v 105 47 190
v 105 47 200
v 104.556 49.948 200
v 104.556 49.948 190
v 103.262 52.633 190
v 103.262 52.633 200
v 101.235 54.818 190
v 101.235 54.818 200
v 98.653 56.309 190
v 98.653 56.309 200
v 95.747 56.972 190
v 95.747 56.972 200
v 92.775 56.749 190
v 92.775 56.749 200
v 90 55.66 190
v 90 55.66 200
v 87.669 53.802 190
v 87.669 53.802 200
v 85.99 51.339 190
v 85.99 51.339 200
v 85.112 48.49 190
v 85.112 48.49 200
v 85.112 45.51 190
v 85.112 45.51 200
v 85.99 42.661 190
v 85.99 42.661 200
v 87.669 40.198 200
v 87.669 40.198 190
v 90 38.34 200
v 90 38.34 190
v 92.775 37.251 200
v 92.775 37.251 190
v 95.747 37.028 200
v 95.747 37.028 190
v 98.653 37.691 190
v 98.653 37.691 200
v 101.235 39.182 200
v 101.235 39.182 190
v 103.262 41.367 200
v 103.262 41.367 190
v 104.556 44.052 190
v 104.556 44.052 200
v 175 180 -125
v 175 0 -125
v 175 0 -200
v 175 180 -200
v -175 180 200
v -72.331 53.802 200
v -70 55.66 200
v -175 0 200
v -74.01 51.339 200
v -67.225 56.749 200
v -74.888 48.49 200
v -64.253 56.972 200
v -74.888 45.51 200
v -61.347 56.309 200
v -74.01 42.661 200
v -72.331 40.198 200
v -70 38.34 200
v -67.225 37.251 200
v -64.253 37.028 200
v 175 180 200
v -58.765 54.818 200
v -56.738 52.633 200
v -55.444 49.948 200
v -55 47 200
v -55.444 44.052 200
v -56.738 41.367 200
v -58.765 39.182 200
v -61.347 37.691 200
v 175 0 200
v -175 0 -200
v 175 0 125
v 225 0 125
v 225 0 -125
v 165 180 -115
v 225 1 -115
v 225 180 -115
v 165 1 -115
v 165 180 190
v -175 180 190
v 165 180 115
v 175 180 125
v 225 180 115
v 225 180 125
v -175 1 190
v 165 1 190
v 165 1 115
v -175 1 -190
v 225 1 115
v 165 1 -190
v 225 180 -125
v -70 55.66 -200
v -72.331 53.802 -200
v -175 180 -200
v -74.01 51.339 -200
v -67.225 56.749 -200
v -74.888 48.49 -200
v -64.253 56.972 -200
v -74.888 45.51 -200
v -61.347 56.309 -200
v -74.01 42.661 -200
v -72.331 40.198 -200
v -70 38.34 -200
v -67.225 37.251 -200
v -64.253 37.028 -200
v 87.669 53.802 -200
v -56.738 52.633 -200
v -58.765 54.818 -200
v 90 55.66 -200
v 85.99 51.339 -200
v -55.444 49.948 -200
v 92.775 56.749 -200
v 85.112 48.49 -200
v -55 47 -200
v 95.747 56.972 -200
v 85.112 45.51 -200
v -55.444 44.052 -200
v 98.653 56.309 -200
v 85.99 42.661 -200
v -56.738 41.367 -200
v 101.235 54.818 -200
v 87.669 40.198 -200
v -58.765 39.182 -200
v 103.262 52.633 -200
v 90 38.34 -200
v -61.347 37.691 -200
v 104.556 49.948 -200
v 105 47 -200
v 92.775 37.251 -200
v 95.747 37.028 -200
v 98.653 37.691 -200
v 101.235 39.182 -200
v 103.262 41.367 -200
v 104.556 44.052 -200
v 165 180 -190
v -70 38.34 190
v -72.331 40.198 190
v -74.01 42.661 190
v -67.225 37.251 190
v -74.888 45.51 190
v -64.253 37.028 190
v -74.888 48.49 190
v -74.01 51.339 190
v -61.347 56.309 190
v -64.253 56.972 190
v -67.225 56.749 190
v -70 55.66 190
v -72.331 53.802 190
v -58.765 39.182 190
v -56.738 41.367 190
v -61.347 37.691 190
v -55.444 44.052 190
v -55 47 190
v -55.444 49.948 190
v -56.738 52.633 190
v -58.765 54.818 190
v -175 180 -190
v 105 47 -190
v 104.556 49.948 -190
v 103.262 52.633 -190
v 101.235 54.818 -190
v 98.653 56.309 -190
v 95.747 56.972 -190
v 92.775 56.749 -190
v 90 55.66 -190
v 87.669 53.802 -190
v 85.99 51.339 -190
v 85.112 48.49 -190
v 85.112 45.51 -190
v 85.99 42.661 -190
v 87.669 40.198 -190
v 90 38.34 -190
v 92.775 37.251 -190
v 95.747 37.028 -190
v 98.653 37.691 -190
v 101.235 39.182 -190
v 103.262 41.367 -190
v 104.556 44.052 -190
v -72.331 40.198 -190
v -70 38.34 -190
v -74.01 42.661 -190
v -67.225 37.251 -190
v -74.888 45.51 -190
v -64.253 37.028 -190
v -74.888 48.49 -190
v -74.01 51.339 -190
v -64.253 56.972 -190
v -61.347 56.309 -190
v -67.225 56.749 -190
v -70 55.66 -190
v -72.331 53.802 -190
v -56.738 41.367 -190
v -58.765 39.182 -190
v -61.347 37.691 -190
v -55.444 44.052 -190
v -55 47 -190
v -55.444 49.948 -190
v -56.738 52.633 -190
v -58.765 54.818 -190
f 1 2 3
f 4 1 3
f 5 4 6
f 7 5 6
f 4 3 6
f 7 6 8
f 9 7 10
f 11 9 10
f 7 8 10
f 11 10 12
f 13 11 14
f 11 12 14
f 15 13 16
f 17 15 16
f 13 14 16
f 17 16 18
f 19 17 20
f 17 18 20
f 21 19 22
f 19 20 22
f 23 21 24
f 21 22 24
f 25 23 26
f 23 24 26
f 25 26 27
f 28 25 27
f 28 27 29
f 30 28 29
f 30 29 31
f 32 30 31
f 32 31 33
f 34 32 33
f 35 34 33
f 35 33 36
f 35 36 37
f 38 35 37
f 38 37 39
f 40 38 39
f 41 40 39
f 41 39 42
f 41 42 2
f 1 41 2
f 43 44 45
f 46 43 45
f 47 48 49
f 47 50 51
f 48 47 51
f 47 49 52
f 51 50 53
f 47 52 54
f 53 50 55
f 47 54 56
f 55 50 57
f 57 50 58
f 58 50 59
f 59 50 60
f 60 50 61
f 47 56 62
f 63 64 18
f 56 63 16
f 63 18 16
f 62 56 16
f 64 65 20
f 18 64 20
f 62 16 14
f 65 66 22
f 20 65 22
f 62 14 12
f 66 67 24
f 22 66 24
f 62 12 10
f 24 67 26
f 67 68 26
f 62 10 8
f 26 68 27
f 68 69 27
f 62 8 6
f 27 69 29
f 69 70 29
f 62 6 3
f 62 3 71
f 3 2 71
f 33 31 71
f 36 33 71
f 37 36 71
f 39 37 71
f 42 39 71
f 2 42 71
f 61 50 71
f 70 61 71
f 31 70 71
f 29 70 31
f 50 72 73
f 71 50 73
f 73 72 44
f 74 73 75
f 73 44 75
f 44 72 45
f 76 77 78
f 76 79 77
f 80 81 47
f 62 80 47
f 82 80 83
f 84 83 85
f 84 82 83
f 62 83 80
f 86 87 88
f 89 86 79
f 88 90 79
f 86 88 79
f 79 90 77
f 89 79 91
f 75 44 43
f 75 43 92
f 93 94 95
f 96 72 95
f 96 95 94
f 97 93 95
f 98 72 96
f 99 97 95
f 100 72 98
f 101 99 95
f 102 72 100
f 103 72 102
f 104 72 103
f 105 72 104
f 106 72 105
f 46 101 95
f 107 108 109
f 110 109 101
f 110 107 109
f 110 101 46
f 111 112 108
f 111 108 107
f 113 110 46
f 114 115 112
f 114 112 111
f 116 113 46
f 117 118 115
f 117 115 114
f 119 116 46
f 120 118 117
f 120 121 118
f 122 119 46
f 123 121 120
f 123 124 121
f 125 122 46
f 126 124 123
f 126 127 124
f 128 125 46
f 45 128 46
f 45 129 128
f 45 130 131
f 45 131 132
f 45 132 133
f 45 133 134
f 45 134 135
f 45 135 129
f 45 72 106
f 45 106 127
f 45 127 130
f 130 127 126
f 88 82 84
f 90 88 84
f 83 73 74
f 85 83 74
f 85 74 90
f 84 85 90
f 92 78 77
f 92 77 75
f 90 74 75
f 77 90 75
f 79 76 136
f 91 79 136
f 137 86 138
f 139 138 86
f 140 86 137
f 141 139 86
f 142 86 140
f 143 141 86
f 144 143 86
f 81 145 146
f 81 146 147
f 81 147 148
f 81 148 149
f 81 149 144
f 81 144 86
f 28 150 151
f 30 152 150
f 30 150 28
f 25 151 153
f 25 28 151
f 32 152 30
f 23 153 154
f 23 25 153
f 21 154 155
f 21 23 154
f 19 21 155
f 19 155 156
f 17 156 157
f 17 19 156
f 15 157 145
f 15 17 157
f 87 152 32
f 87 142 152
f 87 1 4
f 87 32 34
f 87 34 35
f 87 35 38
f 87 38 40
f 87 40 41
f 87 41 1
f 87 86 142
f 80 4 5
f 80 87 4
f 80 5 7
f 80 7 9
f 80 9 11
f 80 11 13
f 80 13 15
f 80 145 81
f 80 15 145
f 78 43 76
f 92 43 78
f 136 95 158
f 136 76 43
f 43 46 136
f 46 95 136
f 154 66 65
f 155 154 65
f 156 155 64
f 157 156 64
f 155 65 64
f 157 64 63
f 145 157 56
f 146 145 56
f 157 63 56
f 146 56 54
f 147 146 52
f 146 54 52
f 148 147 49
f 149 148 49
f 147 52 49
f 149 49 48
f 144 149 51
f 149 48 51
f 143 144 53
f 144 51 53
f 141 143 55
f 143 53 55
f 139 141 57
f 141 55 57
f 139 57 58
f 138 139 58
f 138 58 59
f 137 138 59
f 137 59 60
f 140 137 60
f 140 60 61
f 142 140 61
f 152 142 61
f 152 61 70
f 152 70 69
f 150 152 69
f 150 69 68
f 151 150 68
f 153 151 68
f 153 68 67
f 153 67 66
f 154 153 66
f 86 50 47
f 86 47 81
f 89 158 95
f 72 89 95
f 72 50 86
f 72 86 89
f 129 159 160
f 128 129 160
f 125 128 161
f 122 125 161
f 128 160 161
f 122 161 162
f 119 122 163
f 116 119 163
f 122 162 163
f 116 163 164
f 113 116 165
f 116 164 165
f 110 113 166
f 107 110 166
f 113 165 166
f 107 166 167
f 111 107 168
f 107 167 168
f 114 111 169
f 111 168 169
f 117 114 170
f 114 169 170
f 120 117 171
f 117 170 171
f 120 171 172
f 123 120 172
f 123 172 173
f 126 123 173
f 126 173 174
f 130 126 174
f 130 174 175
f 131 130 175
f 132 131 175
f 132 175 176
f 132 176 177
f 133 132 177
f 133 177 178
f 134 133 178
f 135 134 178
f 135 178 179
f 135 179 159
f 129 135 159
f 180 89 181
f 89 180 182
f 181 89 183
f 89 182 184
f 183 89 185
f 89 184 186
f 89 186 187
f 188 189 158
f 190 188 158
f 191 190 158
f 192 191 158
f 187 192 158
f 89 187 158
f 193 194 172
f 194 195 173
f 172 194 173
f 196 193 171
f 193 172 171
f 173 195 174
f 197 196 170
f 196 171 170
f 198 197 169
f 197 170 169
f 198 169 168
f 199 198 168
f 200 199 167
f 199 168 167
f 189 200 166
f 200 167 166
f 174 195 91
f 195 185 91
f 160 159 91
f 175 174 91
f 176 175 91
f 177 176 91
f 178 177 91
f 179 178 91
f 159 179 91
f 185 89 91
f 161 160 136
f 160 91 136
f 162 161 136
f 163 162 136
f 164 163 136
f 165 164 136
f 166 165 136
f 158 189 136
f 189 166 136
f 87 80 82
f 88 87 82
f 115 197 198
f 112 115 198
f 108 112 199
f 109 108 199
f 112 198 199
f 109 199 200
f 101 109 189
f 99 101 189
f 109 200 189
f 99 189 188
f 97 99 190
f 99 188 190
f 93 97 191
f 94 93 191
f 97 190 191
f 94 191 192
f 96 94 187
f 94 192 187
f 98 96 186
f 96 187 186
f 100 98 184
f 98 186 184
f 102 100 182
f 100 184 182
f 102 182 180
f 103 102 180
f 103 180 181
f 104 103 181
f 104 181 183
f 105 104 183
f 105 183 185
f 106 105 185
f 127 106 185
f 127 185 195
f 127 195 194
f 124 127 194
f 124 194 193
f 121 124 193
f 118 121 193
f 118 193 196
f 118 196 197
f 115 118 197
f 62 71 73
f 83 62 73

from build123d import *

# Parameters (mm, degrees)
SKETCH1_W           = 350
SKETCH1_H           = 400
SKETCH1_W_2         = 50
SKETCH1_H_2         = 250
BOSS_EXTRUDE1_DEPTH = 180
CUT_EXTRUDE1_DEPTH  = 179
SKETCH3_W           = 230
SKETCH3_H           = 179
CUT_EXTRUDE2_DEPTH  = 10
SKETCH4_W           = 380
SKETCH4_H           = 179
CUT_EXTRUDE3_DEPTH  = 10
SKETCH5_R           = 10
CUT_EXTRUDE4_DEPTH  = 401


with BuildPart() as part:
    # Sketch1 → Boss-Extrude1 (new body)
    with BuildSketch(Plane(origin=(0, 0, 0), x_dir=(1, 0, 0), z_dir=(0, 1, 0))):
        Rectangle(SKETCH1_W, SKETCH1_H)
        with Locations((200, 0)):
            Rectangle(SKETCH1_W_2, SKETCH1_H_2)
    extrude(amount=BOSS_EXTRUDE1_DEPTH)

    # Sketch2 → Cut-Extrude1 (cut)
    with BuildSketch(Plane(origin=(0, 180, 0), x_dir=(1, 0, 0), z_dir=(0, 1, 0))):
        Polygon((215, 115), (165, 115), (165, 190), (-165, 190), (-165, -190), (165, -190), (165, -115), (215, -115), align=None)
    extrude(amount=-CUT_EXTRUDE1_DEPTH, mode=Mode.SUBTRACT)

    # Sketch3 → Cut-Extrude2 (cut)
    with BuildSketch(Plane.ZY.offset(-215)):
        with Locations((0, 90.5)):
            Rectangle(SKETCH3_W, SKETCH3_H)
    extrude(amount=-CUT_EXTRUDE2_DEPTH, mode=Mode.SUBTRACT)

    # Sketch4 → Cut-Extrude3 (cut)
    with BuildSketch(Plane(origin=(-165, 0, 0), x_dir=(0, 0, -1), z_dir=(1, 0, 0))):
        with Locations((0, 90.5)):
            Rectangle(SKETCH4_W, SKETCH4_H)
    extrude(amount=-CUT_EXTRUDE3_DEPTH, mode=Mode.SUBTRACT)

    # Sketch5 → Cut-Extrude4 (cut, through all)
    with BuildSketch(Plane.XY.offset(200)):
        with Locations((95, 47)):
            Circle(SKETCH5_R)
        with Locations((-65, 47)):
            Circle(SKETCH5_R)
    extrude(amount=-CUT_EXTRUDE4_DEPTH, mode=Mode.SUBTRACT)


solid = part.part
